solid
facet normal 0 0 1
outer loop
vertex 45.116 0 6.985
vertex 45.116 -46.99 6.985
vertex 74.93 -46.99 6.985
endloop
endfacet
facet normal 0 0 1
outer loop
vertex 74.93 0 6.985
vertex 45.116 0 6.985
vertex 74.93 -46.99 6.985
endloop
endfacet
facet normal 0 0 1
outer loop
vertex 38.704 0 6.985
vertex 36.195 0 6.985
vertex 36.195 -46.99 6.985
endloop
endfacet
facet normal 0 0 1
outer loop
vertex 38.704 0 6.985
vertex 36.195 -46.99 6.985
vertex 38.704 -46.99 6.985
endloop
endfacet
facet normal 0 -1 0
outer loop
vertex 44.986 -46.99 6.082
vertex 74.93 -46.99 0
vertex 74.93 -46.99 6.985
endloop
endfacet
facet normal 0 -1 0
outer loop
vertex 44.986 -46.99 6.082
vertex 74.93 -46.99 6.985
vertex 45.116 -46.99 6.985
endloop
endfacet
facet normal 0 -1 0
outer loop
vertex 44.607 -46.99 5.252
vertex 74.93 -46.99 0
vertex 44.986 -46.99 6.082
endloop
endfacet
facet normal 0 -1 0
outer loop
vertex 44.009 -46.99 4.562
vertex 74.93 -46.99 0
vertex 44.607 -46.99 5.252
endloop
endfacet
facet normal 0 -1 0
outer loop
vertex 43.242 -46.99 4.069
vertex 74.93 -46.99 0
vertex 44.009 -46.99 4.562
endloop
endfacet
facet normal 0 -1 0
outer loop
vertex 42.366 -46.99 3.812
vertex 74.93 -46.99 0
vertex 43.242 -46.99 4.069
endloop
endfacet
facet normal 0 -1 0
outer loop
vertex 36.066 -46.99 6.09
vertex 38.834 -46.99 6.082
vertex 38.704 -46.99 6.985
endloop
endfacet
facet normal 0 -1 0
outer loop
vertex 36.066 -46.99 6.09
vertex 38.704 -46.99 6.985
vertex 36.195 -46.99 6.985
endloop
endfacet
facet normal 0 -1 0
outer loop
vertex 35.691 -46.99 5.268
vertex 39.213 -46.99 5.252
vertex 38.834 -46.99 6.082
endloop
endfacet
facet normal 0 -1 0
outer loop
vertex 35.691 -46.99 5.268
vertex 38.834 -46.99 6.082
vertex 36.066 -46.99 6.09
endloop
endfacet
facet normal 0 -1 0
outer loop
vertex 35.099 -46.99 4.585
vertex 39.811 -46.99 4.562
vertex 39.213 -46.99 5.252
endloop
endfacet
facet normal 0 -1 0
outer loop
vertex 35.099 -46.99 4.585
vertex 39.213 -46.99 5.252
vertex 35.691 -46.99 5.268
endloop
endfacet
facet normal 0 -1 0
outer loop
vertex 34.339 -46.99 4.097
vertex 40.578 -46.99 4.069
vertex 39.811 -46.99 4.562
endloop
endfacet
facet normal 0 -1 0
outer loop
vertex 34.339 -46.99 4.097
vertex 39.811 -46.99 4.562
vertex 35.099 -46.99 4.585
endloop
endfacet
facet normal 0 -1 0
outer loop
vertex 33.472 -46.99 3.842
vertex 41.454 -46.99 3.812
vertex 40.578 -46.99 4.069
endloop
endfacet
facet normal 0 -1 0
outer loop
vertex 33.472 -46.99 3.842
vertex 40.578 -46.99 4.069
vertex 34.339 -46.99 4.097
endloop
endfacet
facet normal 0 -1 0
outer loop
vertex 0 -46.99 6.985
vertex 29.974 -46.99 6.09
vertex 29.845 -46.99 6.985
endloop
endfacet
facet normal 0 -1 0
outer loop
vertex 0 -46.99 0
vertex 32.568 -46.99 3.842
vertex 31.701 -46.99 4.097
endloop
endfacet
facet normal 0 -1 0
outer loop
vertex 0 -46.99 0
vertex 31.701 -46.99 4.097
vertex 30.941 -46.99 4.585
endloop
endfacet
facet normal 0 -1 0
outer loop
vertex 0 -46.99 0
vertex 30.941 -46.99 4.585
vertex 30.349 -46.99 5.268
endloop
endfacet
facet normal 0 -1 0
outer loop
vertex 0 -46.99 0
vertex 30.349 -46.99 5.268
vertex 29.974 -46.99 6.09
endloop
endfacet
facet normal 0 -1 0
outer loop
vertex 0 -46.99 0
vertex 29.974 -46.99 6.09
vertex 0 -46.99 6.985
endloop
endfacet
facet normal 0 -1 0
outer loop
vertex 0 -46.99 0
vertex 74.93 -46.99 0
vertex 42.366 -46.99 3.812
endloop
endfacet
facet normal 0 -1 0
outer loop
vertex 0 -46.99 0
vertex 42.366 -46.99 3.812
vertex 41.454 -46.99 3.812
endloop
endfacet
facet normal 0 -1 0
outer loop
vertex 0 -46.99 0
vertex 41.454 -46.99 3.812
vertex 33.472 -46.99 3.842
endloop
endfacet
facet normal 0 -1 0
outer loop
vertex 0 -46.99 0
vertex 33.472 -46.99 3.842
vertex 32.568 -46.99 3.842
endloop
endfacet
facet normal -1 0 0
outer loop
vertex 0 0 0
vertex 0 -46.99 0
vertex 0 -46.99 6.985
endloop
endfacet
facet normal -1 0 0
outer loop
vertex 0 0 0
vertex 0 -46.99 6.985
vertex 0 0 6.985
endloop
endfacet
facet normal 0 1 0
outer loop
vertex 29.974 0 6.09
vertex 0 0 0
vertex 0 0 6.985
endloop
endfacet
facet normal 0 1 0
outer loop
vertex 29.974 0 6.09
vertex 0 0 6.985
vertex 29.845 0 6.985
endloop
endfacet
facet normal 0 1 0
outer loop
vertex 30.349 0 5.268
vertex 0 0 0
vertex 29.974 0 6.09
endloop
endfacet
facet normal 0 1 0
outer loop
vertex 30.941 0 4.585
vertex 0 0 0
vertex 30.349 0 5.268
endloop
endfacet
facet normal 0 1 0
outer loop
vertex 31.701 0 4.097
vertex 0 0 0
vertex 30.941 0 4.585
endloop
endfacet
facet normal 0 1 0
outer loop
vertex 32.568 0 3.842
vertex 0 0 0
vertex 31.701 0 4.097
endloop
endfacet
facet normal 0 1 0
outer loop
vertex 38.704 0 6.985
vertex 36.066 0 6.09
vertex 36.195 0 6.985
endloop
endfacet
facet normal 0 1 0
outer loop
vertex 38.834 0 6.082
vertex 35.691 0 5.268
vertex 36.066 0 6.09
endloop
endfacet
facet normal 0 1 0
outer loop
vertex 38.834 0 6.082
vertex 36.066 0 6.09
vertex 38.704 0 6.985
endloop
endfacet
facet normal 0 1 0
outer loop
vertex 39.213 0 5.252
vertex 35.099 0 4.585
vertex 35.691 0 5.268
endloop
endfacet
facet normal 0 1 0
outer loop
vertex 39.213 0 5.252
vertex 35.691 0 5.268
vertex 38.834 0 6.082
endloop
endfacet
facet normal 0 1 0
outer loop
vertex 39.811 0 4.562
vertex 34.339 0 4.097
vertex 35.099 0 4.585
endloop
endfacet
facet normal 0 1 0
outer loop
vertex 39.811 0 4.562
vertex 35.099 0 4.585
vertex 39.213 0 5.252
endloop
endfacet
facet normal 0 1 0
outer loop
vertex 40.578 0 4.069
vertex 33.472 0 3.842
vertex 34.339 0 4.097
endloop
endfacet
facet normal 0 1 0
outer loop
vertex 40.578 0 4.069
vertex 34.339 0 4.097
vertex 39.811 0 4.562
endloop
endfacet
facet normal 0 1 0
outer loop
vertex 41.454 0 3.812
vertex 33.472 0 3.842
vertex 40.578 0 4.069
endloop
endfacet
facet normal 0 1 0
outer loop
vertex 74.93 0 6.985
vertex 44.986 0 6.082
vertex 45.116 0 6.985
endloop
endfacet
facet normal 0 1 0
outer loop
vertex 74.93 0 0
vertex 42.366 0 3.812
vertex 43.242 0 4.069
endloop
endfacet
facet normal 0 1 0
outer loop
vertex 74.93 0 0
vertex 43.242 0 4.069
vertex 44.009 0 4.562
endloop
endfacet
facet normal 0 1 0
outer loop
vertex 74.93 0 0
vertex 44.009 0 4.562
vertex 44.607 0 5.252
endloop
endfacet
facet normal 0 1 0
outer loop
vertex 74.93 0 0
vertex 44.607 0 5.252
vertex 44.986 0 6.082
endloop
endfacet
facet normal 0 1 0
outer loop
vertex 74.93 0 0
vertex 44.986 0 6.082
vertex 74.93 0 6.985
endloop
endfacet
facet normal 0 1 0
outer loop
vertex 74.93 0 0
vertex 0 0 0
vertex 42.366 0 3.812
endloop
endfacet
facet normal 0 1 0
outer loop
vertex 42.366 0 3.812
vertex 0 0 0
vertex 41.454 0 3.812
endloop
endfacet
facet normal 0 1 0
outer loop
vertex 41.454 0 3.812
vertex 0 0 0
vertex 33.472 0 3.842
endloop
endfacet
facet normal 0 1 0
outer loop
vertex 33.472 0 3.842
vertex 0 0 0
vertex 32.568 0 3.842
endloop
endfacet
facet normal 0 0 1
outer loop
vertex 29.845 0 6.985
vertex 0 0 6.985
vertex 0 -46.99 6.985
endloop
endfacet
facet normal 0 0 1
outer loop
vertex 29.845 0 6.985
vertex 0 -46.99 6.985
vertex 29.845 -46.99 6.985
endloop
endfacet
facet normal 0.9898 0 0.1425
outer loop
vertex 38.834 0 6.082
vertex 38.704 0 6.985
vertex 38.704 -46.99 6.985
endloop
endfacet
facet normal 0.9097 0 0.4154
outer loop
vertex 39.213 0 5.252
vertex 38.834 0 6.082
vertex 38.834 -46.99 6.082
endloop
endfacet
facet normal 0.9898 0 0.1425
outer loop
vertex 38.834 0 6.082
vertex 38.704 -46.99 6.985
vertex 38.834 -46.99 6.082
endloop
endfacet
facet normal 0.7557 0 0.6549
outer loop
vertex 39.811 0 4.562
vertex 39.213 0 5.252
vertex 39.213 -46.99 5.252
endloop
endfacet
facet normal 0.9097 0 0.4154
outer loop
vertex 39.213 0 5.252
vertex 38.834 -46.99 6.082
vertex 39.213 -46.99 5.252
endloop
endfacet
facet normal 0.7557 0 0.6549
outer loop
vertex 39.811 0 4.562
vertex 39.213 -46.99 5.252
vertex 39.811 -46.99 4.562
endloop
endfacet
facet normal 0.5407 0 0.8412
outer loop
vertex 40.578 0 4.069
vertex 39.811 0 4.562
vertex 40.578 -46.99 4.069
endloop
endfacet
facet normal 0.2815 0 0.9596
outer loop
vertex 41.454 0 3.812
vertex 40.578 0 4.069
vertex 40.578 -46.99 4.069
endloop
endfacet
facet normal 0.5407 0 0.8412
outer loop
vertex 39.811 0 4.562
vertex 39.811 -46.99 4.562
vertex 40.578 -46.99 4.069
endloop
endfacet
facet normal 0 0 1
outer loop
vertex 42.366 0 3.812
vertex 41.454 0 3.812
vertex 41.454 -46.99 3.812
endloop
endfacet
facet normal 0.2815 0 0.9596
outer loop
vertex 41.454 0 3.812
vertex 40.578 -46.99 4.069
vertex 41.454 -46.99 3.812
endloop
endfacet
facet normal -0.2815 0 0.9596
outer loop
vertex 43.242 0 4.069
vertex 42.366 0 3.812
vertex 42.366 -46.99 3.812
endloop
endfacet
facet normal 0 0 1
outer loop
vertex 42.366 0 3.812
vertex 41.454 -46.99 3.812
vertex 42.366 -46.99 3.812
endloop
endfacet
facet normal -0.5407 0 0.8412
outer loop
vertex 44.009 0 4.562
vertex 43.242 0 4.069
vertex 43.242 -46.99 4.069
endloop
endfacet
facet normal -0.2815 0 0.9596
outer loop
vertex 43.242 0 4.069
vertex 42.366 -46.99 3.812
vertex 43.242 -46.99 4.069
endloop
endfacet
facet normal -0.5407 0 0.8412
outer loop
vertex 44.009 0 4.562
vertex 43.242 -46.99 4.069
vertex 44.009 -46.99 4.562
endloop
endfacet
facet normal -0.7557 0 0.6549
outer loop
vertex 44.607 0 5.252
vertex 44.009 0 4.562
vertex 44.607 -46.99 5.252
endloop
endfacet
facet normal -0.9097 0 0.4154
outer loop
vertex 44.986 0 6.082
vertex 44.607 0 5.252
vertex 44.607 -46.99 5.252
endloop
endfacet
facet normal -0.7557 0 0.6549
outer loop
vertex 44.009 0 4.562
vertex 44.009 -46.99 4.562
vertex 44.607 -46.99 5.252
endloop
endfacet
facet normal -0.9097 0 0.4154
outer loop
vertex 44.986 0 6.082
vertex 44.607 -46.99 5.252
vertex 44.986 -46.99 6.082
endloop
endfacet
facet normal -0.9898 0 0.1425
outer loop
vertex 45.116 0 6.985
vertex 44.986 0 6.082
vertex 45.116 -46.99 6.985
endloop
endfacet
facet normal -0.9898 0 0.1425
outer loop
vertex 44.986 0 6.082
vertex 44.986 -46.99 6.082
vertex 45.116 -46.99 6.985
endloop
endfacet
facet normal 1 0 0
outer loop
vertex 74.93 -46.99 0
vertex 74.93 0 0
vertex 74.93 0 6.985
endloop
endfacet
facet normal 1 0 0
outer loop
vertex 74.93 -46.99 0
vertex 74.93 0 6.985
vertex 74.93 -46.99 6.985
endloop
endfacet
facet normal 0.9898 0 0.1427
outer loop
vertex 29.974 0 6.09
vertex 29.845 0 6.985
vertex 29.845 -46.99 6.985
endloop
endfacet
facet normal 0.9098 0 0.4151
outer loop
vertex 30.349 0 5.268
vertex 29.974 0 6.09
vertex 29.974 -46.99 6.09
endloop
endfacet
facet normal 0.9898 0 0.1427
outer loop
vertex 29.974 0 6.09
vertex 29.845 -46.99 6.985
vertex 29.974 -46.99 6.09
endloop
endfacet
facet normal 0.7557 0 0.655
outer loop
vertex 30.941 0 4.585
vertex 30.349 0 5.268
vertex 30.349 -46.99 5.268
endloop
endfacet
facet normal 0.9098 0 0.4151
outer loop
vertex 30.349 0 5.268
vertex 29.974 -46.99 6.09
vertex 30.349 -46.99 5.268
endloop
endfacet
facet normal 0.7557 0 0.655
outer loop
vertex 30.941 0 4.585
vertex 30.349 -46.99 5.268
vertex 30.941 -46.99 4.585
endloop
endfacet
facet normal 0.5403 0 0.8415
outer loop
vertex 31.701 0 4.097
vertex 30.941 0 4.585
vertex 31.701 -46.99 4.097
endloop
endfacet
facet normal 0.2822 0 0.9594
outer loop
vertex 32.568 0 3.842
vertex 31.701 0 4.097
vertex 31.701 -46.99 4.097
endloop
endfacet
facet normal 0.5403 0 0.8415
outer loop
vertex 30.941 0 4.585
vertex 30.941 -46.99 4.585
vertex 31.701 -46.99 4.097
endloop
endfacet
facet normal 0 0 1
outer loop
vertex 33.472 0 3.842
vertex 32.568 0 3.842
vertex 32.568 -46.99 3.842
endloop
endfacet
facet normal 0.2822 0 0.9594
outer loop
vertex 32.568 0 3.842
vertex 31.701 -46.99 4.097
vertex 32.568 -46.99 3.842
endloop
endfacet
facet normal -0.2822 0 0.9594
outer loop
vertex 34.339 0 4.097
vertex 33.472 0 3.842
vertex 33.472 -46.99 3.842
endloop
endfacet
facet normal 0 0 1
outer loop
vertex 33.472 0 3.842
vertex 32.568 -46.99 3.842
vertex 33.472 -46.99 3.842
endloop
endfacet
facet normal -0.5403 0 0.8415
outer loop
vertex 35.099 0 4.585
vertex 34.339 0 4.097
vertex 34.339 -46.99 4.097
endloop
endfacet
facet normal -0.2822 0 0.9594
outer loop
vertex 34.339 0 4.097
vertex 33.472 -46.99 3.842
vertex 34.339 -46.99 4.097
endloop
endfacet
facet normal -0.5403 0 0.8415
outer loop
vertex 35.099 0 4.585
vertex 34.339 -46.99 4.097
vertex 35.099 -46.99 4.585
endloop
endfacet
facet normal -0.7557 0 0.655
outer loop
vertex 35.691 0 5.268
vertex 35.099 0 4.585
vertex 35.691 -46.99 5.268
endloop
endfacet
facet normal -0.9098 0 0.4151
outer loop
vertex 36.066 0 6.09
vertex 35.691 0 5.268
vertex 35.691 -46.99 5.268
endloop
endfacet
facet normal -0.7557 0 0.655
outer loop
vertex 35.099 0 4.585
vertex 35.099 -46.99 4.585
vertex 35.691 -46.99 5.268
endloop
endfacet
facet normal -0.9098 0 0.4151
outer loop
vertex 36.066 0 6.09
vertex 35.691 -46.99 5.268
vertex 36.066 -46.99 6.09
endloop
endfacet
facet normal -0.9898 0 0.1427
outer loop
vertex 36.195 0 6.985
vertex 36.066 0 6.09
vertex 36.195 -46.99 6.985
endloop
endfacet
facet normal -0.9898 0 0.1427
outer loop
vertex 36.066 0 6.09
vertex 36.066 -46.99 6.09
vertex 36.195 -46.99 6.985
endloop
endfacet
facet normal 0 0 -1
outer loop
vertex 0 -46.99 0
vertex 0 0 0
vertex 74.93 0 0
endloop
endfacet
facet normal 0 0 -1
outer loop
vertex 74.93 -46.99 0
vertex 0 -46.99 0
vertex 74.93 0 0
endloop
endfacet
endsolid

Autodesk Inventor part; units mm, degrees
ref_plane "YZ Plane" through (0, 0, 0) normal (1, 0, 0) x (0, 1, 0)
ref_plane "XZ Plane" through (0, 0, 0) normal (0, 1, 0) x (-1, 0, 0)
ref_plane "XY Plane" through (0, 0, 0) normal (0, 0, 1) x (1, 0, 0)
sketch "Sketch1" plane through (0, 0, 0) normal (0, 0, 1) x (1, 0, 0)
  line L0 (0, 0) -> (74.93, 0)
  line L1 (74.93, 0) -> (74.93, -46.99)
  line L2 (74.93, -46.99) -> (0, -46.99)
  line L3 (0, -46.99) -> (0, 0)
  dimension "d0" = 74.93
  dimension "d1" = 46.99
extrude "Extrusion1" add sketch "Sketch1" along normal blind 6.985
sketch "Sketch2" plane through (0, -46.99, 0) normal (0, -1, 0) x (1, 0, 0)
  line L0 (74.93, 6.985) -> (0, 6.985) projected
  circle A0 centre (33.02, 6.985) radius 3.175
  circle A1 centre (41.91, 6.985) radius 3.2056
  line L1 (74.93, 0) -> (74.93, 6.985) projected
  point P0 (0, 0)
  dimension "d4" = 6.35
  dimension "d5" = 8.89
  dimension "d6" = 33.02
extrude "Extrusion2" cut sketch "Sketch2" against normal blind 101.6
properties part number "Heatsink cu base" material "Copper"
